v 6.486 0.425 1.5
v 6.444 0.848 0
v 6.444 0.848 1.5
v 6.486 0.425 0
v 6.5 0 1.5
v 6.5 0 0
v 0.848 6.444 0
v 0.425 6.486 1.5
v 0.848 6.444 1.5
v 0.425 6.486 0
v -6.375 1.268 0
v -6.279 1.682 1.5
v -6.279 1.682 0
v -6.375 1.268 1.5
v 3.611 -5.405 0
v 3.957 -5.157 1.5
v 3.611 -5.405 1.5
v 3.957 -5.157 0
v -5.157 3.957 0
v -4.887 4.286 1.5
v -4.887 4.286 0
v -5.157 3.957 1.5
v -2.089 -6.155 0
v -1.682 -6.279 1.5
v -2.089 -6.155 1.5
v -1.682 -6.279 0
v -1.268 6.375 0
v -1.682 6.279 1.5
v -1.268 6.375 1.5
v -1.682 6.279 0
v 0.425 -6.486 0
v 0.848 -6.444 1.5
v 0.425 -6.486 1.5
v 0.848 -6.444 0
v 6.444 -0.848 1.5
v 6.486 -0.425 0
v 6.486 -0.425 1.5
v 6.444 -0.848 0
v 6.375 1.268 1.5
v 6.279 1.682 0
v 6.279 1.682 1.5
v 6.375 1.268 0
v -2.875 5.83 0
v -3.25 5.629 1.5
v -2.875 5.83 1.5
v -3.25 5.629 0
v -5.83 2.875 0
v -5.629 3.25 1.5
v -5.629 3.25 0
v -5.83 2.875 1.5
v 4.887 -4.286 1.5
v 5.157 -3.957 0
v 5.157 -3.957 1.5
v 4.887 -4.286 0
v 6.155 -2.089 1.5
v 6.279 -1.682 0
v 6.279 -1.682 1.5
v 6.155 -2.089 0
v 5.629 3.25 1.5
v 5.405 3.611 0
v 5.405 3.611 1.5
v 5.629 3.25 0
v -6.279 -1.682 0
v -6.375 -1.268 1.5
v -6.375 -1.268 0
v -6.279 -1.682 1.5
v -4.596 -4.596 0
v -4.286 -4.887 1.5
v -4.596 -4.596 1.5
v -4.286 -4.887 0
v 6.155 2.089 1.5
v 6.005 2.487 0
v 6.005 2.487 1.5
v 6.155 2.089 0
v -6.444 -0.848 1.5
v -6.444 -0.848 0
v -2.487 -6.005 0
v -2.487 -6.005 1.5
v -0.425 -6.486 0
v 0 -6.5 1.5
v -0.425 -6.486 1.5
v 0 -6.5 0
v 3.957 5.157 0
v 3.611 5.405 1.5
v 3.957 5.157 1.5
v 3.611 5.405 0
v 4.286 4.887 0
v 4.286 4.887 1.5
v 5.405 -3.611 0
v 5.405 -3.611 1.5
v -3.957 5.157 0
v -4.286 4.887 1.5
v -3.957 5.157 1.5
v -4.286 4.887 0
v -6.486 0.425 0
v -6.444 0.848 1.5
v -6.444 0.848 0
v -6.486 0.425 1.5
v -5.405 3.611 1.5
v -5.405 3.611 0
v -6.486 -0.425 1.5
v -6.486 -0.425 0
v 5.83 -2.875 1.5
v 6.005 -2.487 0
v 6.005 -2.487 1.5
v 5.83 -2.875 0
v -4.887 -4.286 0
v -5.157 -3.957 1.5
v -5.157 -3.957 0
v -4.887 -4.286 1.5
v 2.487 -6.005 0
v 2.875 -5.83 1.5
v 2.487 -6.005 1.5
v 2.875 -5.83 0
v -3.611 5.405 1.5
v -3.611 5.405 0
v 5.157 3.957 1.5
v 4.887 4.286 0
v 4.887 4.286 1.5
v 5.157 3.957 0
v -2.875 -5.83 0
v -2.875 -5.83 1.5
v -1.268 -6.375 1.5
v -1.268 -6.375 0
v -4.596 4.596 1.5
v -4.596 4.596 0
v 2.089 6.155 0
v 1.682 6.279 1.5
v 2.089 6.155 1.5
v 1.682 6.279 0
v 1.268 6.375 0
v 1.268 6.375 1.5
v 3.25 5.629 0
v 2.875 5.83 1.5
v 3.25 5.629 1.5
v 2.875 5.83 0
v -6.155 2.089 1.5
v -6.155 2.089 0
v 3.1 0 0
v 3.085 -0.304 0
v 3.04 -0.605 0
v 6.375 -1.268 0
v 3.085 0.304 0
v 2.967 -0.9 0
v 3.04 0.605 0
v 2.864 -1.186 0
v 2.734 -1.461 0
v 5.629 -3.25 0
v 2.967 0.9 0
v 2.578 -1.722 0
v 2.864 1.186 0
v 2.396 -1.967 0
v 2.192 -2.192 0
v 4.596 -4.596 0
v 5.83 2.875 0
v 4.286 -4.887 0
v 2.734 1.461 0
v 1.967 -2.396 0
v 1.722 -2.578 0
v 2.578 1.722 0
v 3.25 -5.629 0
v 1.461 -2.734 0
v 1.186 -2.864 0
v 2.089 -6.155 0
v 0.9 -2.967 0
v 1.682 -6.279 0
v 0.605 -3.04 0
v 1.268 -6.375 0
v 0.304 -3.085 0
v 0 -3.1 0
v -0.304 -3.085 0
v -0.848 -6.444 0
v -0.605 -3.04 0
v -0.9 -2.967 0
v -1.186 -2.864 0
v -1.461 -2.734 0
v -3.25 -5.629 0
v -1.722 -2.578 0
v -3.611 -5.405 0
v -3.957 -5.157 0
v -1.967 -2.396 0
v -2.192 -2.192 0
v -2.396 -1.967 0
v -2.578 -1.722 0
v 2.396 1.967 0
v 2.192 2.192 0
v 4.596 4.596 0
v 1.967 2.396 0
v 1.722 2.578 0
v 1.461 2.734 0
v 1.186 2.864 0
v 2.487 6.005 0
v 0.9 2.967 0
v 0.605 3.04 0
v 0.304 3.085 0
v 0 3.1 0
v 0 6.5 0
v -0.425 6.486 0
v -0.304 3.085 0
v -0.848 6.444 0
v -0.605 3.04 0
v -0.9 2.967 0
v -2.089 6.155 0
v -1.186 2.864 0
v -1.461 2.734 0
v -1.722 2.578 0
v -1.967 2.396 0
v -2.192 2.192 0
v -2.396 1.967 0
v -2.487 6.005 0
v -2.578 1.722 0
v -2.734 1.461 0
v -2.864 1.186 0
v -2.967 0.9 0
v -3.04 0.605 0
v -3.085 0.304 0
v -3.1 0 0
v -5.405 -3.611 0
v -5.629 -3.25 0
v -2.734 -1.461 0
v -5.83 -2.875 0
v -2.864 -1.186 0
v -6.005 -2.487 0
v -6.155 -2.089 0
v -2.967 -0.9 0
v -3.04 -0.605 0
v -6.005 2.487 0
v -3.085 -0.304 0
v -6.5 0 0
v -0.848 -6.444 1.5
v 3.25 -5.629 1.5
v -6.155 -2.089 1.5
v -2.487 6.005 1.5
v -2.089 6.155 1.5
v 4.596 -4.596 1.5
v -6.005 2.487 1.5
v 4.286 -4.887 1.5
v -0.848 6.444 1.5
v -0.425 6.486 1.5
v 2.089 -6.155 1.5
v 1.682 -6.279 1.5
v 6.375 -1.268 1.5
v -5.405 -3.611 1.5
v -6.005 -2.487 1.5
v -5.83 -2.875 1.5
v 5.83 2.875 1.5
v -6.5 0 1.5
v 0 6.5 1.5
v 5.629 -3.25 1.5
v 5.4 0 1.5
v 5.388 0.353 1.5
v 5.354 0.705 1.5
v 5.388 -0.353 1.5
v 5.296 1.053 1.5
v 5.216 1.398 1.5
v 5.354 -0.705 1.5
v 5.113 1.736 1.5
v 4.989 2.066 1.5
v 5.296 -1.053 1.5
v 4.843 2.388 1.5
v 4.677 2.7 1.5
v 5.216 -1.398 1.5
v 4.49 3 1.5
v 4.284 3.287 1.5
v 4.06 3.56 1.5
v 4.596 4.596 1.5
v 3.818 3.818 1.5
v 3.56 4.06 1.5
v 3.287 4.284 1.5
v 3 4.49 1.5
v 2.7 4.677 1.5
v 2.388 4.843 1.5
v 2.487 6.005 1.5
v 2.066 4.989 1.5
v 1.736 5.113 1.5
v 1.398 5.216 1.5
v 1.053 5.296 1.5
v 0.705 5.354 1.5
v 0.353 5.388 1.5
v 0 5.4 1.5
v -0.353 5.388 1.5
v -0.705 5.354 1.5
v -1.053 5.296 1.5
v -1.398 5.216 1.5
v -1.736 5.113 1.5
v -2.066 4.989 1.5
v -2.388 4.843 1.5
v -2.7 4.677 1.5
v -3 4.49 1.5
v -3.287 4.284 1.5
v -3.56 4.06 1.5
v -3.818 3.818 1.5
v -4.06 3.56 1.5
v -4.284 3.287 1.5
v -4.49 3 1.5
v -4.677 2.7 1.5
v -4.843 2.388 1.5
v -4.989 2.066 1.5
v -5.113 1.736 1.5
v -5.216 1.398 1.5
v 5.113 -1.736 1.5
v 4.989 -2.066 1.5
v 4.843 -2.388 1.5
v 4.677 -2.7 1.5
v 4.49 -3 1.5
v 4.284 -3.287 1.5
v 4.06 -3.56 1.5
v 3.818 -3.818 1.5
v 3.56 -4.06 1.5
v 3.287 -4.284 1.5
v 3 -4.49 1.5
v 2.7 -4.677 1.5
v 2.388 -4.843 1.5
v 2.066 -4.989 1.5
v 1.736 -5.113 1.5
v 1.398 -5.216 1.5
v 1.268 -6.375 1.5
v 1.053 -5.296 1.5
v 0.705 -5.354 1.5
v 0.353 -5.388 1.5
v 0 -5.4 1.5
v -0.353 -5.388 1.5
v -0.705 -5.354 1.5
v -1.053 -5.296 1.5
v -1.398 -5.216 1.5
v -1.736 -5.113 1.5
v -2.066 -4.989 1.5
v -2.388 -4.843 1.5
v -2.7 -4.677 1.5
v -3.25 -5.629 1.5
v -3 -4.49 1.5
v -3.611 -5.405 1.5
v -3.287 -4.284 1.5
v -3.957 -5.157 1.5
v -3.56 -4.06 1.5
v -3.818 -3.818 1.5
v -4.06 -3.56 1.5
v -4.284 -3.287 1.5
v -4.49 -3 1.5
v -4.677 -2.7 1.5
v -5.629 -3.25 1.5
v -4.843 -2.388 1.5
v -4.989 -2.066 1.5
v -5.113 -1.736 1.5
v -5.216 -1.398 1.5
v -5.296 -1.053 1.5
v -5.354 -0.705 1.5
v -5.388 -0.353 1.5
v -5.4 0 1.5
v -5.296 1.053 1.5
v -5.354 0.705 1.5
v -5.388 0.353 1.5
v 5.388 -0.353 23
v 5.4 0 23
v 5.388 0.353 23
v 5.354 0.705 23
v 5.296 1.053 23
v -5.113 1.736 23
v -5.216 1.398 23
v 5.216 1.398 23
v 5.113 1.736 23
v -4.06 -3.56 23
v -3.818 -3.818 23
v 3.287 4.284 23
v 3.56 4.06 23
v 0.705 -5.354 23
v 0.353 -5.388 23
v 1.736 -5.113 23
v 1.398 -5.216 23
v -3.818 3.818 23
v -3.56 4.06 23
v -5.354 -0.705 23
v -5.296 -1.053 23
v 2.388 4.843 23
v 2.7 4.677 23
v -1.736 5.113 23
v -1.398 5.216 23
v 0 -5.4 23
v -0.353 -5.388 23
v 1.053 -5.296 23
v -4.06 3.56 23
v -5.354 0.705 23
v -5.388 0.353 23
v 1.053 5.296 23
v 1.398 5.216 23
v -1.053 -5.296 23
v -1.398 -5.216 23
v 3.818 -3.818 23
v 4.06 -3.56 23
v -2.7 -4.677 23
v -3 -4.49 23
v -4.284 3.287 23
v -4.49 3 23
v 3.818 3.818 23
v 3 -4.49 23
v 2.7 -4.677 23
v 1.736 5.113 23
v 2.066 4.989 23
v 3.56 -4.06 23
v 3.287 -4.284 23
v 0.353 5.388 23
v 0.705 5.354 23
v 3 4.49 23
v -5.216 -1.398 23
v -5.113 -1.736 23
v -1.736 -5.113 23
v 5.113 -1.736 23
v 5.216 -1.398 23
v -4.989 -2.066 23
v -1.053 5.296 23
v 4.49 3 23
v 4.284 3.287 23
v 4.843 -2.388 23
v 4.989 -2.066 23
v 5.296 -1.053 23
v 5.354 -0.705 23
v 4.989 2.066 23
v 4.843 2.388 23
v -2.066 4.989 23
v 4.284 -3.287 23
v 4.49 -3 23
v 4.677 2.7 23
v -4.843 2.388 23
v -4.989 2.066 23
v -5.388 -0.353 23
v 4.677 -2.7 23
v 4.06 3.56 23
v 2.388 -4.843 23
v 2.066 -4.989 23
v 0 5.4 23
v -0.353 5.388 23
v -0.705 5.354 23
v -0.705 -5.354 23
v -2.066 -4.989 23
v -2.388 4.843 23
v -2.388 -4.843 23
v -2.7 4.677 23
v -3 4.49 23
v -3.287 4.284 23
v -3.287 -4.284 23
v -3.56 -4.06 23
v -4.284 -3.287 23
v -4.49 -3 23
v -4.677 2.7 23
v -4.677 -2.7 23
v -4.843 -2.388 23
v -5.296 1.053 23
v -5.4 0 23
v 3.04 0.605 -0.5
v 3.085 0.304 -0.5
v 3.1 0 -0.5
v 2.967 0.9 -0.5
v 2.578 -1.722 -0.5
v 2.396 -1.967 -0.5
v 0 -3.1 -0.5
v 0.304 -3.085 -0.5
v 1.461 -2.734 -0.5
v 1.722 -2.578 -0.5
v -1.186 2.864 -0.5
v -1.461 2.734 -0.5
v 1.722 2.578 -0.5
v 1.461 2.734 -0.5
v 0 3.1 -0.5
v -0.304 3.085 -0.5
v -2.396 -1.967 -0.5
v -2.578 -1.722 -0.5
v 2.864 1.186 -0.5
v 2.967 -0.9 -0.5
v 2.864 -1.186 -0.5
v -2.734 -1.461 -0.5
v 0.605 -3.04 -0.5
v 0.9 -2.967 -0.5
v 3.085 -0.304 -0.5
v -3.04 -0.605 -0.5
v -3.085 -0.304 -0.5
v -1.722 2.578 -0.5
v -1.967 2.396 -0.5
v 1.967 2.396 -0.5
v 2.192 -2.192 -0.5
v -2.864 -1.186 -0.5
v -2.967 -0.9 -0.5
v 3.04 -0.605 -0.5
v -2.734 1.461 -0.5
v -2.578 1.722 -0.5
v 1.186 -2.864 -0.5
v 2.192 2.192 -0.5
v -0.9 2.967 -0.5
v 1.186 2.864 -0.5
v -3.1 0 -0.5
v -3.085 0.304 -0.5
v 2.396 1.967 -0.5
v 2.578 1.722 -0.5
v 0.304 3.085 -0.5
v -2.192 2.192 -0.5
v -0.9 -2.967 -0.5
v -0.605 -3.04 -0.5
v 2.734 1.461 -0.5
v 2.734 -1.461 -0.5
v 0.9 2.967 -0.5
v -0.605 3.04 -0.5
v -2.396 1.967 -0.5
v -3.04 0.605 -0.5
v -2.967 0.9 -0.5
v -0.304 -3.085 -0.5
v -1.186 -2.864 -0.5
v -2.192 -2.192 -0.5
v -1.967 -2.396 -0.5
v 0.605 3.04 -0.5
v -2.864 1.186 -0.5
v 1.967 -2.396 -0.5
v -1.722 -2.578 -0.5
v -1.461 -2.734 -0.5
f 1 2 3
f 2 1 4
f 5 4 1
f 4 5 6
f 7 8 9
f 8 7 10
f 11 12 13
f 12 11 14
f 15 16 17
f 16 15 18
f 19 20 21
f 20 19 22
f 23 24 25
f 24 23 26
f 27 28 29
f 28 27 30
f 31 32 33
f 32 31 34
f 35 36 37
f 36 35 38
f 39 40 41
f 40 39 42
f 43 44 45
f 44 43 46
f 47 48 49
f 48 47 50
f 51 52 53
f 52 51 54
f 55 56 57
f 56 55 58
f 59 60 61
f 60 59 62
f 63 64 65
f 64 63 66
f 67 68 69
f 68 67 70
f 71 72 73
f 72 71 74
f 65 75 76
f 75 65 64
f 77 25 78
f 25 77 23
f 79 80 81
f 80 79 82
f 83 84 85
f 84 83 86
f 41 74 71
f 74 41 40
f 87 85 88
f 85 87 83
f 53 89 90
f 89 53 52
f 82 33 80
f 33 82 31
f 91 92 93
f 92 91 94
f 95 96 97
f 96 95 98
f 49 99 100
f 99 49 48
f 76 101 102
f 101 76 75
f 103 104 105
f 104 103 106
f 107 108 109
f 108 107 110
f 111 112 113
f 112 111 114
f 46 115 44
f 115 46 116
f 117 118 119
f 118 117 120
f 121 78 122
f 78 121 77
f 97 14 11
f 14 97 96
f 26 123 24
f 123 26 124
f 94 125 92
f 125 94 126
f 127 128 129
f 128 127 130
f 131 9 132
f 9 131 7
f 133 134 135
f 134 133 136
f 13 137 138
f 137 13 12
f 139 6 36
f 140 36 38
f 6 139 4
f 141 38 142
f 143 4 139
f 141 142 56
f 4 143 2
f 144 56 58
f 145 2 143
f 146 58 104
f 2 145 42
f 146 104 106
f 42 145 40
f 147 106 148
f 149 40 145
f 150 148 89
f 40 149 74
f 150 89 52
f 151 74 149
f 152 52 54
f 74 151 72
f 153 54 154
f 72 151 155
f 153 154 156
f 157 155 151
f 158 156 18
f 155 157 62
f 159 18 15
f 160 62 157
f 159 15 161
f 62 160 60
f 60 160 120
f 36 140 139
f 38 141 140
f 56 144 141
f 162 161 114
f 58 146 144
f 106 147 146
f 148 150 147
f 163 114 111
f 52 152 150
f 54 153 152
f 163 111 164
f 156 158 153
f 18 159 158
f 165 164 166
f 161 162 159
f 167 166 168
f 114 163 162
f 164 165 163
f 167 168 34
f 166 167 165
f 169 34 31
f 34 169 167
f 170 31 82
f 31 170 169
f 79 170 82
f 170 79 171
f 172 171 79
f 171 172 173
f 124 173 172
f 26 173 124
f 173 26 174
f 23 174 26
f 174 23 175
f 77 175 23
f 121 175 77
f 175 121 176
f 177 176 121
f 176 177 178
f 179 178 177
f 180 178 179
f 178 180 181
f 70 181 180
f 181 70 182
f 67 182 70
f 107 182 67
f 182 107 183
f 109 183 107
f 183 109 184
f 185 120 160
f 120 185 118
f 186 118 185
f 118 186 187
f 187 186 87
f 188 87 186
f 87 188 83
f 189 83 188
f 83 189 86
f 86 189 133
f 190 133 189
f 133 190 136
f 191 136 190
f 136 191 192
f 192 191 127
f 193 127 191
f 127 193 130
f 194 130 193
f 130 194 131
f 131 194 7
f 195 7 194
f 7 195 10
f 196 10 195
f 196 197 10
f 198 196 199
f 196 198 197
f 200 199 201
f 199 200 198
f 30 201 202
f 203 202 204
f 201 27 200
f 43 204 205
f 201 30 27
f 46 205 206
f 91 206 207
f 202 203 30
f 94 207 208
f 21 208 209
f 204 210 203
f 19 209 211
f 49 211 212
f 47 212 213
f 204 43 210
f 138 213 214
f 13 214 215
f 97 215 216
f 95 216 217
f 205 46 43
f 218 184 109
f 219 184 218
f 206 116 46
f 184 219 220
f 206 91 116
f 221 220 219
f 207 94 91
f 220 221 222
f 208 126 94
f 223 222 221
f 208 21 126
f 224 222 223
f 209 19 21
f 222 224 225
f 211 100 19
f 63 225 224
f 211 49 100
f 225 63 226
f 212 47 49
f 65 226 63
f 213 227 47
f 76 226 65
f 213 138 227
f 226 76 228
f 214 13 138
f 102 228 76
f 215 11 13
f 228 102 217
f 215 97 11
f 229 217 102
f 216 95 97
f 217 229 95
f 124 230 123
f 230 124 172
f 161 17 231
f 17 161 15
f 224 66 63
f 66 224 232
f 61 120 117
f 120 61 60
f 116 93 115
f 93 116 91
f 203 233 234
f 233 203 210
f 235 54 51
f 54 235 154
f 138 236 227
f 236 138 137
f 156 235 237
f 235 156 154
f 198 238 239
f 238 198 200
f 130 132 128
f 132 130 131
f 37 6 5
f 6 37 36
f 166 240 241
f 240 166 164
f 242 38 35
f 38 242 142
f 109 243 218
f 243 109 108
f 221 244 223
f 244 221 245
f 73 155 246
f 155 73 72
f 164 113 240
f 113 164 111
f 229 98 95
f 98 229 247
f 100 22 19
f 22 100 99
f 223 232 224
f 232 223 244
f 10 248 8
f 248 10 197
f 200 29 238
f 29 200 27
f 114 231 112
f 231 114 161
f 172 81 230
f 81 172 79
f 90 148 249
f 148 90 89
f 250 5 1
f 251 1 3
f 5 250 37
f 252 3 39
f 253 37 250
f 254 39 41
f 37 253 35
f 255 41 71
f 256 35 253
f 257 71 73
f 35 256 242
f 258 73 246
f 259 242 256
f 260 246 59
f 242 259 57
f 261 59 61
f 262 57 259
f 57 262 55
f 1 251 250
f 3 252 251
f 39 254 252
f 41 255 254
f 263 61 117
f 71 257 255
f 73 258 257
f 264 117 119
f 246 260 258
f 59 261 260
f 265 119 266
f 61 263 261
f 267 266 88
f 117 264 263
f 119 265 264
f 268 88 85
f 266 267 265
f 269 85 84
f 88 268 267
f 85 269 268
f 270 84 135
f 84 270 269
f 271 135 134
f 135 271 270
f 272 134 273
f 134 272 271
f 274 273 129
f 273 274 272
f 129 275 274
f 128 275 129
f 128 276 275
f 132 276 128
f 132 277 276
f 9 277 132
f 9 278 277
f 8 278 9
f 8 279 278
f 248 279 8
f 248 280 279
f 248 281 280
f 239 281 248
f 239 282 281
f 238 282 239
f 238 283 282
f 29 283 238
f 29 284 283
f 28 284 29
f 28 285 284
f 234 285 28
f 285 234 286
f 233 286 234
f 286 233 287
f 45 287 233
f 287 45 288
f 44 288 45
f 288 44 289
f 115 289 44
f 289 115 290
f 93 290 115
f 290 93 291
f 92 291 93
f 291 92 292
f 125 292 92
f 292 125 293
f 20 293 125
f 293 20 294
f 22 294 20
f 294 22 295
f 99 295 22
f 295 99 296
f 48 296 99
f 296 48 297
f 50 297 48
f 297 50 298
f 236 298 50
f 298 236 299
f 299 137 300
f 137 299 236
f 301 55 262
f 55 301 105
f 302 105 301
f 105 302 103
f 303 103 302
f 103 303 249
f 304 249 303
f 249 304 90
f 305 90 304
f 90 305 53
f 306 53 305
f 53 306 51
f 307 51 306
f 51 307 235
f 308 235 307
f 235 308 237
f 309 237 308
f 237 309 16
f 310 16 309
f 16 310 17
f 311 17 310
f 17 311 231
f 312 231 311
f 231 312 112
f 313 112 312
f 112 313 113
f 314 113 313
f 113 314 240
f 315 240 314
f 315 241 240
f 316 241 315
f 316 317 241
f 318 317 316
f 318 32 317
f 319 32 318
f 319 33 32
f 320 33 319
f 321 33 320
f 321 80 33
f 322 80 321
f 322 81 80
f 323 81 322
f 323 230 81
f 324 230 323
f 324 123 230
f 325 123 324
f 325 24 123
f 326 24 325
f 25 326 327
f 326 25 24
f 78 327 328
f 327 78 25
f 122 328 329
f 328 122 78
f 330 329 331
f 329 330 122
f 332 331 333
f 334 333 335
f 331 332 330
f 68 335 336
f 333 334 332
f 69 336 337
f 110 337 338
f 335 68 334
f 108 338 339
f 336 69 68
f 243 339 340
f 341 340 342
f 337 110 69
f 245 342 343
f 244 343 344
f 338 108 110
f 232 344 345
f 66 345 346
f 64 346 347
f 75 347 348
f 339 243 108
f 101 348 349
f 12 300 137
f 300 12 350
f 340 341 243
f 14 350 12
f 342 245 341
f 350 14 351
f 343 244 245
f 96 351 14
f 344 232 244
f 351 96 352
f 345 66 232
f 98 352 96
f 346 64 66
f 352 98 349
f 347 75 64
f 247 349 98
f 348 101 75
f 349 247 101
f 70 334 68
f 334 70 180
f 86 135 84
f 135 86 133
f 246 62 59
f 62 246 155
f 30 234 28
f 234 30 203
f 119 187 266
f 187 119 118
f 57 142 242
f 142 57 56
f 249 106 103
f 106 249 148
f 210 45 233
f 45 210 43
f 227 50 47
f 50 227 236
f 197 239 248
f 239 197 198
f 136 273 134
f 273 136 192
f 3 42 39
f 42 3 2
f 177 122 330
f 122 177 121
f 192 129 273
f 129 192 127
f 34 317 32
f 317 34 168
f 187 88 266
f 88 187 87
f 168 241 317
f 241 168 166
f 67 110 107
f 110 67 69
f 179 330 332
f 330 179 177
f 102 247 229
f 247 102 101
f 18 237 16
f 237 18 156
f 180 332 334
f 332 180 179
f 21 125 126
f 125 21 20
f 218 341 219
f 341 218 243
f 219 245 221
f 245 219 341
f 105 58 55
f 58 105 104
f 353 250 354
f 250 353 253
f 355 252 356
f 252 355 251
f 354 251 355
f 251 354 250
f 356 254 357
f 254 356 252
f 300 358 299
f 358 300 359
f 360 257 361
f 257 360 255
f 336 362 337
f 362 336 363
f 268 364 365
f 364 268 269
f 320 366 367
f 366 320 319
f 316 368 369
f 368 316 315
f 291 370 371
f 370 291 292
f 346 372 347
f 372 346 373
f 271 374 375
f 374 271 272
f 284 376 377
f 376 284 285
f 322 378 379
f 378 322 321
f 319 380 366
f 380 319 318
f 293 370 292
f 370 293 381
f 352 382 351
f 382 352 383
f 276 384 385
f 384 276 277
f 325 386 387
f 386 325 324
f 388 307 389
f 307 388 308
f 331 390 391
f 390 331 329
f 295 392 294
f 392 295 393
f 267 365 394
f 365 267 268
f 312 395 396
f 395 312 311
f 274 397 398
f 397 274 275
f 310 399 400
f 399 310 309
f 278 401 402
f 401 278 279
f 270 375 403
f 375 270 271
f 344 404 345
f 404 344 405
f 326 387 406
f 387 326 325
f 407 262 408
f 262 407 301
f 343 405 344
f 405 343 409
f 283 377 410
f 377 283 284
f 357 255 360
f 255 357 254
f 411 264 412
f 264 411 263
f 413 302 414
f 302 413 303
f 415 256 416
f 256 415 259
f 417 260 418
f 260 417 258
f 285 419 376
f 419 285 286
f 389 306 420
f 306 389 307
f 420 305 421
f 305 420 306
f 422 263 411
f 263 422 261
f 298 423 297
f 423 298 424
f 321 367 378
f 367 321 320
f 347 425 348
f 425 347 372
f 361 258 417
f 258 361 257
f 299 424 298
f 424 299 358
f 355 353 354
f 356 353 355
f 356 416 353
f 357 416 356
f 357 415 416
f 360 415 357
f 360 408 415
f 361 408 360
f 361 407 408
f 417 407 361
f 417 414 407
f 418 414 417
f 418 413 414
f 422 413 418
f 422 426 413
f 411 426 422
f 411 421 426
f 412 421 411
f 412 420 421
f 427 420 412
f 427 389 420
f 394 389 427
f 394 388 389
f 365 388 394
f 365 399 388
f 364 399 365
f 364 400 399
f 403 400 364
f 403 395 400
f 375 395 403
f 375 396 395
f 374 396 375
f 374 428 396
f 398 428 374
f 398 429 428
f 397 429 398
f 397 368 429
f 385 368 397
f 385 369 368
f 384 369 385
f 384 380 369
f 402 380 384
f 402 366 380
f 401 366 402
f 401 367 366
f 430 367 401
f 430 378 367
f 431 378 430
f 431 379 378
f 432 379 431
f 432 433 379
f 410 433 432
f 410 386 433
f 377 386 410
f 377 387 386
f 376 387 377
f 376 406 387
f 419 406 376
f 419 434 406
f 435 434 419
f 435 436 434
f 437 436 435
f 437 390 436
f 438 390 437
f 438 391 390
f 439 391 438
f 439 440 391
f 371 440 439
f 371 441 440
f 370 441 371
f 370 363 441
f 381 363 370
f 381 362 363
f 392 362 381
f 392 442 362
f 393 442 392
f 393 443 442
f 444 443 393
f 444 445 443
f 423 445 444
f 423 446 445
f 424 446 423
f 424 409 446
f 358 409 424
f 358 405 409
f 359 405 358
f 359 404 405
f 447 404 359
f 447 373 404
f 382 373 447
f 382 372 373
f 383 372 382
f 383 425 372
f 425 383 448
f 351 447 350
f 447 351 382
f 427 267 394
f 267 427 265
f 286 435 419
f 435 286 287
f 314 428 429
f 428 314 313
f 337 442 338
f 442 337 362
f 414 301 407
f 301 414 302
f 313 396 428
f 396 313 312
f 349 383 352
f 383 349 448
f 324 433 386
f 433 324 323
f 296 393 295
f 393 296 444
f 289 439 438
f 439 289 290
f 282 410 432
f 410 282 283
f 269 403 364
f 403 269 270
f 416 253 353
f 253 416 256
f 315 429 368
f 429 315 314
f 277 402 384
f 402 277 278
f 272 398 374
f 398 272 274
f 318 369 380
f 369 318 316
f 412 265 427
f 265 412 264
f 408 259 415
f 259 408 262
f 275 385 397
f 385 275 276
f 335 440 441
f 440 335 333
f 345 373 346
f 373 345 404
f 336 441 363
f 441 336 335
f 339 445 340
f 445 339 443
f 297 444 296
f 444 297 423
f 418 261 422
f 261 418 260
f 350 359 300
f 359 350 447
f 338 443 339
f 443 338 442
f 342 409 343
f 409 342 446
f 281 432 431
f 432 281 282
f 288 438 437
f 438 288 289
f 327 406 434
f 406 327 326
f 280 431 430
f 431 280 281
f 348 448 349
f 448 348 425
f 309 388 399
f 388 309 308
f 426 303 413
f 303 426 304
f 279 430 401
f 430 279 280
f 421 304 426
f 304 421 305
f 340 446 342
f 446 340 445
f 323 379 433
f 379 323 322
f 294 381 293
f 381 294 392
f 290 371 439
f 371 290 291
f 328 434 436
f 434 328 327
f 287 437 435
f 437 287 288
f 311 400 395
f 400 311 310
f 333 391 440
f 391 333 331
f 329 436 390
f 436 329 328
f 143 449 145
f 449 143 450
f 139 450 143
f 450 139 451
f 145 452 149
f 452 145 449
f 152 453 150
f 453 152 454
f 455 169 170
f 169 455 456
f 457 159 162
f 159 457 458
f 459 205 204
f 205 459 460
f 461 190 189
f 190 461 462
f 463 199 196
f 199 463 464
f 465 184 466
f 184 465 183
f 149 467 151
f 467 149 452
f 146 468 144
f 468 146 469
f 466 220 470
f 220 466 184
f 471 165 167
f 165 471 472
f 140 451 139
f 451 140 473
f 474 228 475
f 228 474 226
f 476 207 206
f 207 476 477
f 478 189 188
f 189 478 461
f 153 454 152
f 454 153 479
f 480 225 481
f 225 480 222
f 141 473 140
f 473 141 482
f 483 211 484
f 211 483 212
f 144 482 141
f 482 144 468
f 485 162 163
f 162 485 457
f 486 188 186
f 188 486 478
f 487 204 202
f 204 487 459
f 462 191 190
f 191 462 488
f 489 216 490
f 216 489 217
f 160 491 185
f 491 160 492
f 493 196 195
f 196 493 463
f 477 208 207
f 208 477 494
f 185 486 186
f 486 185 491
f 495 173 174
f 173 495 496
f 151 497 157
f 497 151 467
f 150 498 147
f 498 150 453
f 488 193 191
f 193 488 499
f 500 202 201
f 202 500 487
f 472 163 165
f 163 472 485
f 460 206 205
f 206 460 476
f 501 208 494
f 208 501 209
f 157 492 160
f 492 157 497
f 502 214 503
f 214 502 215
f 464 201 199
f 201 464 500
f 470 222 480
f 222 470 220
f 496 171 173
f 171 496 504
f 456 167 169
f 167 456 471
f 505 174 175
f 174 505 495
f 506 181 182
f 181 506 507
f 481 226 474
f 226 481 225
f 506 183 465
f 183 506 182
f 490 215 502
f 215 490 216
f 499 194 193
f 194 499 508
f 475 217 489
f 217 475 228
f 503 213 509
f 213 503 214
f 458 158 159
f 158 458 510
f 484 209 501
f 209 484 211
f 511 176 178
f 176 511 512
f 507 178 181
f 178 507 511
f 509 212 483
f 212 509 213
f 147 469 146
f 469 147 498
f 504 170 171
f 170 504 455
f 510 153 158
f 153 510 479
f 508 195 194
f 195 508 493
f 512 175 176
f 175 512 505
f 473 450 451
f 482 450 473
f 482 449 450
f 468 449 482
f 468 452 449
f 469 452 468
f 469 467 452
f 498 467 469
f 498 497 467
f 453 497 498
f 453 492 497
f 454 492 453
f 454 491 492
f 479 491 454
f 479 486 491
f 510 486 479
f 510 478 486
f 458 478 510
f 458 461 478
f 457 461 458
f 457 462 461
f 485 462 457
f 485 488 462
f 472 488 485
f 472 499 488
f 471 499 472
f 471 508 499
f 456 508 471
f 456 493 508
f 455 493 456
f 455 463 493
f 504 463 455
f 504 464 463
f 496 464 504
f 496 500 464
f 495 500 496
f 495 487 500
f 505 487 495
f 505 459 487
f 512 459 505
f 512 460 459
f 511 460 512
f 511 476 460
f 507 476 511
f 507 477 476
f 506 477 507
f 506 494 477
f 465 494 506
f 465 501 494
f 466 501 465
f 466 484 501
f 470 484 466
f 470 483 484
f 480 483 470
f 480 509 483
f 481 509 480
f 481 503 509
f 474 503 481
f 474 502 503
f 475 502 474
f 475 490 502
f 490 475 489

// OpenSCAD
// PCR tube adapter sleeve: sits in a 1.5 mL rack hole and cradles a 0.2 mL tube
// Print orientation: collar on the bed (z = 0), sleeve body builds upward (+Z)

// ---------------- Parameters ----------------
collar_d        = 13;    // collar outer diameter (keeps the 1.5 mL hole)
collar_t        = 1.5;   // collar thickness (z = 0 to 1.5)
sleeve_od       = 10.8;  // sleeve body outer diameter
sleeve_h        = 21.5;  // sleeve body height above the collar (z = 1.5 to 23.0)
bore_d          = 6.2;   // straight through-bore diameter (0.2 mL tube clearance)
eps             = 0.5;   // cutter overshoot past faces

$fn = 96;

// ---------------- Model ----------------
union() {
    // Collar: disc from z = 0 to 1.5
    cylinder(d = collar_d, h = collar_t);

    // Sleeve body: tube from z = 1.5 to 23.0 (10.8 mm OD, 6.2 mm bore)
    translate([0, 0, collar_t])
        cylinder(d = sleeve_od, h = sleeve_h, $fn = 96);
}

// Through-bore: open at both ends, extends eps above and below the part
translate([0, 0, -eps])
    cylinder(d = bore_d, h = sleeve_h + 2 * eps, $fn = 64);
